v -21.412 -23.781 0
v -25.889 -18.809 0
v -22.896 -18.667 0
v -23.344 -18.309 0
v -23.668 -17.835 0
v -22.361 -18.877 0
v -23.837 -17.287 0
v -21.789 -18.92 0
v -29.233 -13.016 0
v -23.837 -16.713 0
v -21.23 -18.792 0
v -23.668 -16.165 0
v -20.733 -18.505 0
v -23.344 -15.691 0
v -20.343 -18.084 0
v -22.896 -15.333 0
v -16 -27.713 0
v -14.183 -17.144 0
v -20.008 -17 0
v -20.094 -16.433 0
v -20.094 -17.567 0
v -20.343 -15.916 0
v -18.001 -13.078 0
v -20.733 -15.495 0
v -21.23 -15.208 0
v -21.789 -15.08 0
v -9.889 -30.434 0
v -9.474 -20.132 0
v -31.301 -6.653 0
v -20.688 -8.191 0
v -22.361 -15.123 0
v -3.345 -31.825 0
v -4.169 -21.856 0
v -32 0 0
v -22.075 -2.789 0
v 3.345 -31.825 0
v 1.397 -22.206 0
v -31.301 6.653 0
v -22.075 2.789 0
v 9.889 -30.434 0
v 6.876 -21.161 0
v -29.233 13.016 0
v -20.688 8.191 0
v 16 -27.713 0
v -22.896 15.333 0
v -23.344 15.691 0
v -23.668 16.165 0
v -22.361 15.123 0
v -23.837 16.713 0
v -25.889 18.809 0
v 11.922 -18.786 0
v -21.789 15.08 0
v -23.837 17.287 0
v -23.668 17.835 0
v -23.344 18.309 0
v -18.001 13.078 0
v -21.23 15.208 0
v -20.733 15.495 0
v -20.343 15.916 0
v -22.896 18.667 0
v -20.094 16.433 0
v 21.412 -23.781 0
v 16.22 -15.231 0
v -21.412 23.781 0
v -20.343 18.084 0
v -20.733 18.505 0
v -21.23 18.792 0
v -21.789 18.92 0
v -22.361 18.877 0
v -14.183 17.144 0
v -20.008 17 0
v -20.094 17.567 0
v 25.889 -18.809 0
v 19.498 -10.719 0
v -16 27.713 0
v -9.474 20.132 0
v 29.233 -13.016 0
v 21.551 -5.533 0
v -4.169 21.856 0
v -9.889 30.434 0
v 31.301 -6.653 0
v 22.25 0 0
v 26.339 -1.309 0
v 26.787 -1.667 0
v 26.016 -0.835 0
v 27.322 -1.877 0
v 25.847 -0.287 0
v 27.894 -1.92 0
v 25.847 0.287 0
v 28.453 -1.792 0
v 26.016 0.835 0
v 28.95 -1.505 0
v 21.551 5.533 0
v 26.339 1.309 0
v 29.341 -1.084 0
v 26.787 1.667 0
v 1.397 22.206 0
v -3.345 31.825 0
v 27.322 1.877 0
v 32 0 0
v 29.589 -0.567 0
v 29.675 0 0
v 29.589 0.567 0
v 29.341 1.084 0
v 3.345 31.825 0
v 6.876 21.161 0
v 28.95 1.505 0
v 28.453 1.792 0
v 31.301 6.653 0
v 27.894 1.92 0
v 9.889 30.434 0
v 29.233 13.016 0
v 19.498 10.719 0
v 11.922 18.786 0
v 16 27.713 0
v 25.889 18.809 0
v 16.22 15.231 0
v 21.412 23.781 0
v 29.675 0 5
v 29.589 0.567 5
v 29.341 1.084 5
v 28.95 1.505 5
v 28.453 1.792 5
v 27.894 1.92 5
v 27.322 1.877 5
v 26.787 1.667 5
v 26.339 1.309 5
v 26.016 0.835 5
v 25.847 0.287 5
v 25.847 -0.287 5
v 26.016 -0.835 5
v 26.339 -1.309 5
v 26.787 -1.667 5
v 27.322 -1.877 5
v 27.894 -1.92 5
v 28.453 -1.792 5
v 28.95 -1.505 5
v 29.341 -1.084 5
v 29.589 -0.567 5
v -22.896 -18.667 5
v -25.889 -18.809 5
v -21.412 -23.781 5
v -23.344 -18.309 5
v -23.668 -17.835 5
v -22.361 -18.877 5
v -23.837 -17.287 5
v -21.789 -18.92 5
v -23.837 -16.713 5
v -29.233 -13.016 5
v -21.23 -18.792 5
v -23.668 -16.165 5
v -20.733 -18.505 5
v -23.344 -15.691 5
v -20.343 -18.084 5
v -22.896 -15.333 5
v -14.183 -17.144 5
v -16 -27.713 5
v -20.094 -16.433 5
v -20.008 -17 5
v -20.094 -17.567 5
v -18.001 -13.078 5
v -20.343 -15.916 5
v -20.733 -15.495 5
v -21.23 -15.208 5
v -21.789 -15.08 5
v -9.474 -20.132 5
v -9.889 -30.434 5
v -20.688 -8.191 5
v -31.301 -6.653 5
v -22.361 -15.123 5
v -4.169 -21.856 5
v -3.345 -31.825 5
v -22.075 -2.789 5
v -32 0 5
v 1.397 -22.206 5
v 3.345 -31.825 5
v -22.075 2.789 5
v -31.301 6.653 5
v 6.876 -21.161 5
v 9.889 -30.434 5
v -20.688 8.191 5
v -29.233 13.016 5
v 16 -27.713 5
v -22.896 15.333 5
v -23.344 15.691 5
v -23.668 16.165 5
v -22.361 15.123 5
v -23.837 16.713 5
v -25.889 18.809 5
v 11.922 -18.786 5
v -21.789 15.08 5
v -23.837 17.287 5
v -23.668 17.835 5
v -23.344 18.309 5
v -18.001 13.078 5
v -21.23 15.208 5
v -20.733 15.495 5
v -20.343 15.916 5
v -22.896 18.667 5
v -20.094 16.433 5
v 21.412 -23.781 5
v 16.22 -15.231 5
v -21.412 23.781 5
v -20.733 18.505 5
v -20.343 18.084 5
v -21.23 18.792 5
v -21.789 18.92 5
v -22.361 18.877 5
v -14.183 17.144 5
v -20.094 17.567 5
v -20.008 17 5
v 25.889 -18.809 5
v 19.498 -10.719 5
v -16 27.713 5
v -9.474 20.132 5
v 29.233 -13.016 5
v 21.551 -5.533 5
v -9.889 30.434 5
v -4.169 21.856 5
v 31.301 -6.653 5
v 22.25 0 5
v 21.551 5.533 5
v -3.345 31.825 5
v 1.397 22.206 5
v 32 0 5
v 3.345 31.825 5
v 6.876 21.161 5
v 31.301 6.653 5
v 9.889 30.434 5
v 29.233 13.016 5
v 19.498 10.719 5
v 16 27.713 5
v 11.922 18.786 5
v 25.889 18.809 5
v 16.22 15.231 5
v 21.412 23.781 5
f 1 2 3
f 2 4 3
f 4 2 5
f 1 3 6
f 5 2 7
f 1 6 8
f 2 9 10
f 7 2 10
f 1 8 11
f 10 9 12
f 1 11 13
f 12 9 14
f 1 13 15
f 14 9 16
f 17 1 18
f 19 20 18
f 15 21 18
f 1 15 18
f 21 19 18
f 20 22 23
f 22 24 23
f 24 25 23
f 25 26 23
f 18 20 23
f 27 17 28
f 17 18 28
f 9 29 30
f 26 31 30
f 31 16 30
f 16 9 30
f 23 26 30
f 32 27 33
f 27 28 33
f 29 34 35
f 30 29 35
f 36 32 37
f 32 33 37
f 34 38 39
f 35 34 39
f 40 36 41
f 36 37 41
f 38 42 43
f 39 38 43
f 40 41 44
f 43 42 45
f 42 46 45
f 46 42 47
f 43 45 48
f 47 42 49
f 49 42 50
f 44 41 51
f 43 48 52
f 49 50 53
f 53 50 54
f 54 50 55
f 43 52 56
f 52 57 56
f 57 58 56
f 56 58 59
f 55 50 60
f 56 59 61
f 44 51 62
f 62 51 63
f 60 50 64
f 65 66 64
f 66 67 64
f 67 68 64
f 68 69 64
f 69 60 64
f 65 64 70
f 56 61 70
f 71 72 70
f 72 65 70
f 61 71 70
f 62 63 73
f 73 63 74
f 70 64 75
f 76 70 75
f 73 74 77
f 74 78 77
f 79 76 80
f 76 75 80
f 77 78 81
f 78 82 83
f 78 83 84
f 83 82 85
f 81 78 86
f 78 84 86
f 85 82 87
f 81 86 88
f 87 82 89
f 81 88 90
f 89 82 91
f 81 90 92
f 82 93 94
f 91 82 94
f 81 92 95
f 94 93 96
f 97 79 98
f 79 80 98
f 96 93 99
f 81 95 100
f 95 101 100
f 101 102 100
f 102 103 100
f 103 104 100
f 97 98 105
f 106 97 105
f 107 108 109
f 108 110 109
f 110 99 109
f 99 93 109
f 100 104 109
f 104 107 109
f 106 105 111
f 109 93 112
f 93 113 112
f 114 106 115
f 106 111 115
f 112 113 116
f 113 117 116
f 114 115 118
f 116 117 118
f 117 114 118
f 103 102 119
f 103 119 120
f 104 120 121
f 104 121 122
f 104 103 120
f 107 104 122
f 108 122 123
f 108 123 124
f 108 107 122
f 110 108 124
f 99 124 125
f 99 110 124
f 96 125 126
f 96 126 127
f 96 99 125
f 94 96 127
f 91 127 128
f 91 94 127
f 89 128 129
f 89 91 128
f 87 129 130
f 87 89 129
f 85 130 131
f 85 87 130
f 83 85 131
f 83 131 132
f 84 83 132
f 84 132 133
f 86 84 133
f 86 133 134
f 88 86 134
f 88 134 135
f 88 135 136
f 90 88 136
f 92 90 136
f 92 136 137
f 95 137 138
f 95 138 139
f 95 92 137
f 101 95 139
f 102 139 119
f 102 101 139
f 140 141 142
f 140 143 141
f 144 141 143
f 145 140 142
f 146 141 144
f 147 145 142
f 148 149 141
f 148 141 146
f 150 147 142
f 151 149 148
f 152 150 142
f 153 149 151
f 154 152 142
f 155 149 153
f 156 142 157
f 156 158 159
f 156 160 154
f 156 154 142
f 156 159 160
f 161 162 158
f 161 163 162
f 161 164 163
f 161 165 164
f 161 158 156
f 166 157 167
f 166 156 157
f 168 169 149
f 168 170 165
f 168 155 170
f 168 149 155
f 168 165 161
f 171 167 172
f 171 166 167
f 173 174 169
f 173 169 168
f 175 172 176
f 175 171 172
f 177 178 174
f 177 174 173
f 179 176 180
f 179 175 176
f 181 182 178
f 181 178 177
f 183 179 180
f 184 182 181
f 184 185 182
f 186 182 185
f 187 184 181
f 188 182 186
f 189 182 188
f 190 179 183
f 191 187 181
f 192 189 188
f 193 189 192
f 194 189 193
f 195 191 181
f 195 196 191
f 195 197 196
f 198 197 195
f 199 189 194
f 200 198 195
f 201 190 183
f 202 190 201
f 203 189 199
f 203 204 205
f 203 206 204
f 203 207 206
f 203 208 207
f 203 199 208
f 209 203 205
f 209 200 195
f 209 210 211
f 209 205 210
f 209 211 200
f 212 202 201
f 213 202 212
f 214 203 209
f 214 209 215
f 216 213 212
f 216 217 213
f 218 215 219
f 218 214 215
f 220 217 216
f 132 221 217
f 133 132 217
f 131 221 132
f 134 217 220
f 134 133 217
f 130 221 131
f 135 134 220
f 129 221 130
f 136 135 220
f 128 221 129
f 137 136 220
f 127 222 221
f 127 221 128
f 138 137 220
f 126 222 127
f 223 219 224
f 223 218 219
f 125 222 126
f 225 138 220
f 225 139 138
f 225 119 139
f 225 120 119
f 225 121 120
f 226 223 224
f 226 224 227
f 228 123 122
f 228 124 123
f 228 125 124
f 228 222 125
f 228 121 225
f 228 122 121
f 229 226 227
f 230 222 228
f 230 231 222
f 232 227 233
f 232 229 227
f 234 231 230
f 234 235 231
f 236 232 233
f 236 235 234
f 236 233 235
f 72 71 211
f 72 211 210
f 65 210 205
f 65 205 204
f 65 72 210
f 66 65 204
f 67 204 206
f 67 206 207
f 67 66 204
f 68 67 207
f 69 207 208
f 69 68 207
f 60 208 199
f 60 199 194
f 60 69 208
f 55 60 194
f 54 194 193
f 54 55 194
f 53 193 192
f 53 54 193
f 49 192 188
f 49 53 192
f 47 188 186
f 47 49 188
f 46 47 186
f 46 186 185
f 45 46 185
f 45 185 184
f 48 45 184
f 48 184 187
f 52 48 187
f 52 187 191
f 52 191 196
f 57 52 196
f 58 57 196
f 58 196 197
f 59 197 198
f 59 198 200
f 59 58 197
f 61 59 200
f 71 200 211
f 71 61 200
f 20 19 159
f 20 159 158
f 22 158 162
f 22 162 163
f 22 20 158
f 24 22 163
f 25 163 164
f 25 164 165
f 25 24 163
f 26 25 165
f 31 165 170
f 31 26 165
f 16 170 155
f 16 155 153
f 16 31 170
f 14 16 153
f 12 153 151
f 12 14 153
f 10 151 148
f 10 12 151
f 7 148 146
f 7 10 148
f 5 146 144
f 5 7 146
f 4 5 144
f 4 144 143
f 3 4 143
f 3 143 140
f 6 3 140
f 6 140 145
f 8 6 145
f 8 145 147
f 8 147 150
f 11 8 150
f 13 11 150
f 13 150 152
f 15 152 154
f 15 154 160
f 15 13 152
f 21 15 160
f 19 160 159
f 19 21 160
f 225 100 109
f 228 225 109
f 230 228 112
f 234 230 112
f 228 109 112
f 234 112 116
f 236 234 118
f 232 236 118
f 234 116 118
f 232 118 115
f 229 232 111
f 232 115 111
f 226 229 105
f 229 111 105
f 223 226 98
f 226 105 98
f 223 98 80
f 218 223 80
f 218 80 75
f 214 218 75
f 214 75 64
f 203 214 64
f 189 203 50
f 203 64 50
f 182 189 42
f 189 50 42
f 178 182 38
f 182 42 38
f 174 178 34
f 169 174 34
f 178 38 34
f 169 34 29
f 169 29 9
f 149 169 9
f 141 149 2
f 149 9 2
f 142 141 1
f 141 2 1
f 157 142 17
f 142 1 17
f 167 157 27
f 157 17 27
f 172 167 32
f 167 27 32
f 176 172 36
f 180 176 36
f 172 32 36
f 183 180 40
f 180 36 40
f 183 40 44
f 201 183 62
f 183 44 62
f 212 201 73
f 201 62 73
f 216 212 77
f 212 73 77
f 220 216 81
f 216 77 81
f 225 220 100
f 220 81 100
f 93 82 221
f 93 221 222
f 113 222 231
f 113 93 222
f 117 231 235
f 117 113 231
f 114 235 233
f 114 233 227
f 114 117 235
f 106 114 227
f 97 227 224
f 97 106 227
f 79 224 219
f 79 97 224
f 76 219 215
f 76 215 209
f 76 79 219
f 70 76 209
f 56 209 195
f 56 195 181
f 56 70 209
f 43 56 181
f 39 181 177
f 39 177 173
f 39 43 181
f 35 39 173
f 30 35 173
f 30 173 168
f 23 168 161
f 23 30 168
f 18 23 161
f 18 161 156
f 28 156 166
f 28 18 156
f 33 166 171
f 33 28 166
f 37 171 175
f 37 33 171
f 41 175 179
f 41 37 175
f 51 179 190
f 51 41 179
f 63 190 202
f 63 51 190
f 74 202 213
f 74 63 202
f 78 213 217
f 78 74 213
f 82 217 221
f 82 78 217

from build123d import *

# Parameters (mm, degrees)
ESQUISSE3_R        = 32
ESQUISSE3_R_2      = 22.25
ESQUISSE3_R_3      = 1.925
BOSS_EXTRU_1_DEPTH = 5


with BuildPart() as part:
    # Esquisse3 → Boss.-Extru.1 (new body)
    with BuildSketch(Plane.XY):
        Circle(ESQUISSE3_R)
        Circle(ESQUISSE3_R_2, mode=Mode.SUBTRACT)
        with Locations((27.75, 0)):
            Circle(ESQUISSE3_R_3, mode=Mode.SUBTRACT)
        with Locations((-21.933137031, 17)):
            Circle(ESQUISSE3_R_3, mode=Mode.SUBTRACT)
        with Locations((-21.933137031, -17)):
            Circle(ESQUISSE3_R_3, mode=Mode.SUBTRACT)
    extrude(amount=BOSS_EXTRU_1_DEPTH)


solid = part.part
